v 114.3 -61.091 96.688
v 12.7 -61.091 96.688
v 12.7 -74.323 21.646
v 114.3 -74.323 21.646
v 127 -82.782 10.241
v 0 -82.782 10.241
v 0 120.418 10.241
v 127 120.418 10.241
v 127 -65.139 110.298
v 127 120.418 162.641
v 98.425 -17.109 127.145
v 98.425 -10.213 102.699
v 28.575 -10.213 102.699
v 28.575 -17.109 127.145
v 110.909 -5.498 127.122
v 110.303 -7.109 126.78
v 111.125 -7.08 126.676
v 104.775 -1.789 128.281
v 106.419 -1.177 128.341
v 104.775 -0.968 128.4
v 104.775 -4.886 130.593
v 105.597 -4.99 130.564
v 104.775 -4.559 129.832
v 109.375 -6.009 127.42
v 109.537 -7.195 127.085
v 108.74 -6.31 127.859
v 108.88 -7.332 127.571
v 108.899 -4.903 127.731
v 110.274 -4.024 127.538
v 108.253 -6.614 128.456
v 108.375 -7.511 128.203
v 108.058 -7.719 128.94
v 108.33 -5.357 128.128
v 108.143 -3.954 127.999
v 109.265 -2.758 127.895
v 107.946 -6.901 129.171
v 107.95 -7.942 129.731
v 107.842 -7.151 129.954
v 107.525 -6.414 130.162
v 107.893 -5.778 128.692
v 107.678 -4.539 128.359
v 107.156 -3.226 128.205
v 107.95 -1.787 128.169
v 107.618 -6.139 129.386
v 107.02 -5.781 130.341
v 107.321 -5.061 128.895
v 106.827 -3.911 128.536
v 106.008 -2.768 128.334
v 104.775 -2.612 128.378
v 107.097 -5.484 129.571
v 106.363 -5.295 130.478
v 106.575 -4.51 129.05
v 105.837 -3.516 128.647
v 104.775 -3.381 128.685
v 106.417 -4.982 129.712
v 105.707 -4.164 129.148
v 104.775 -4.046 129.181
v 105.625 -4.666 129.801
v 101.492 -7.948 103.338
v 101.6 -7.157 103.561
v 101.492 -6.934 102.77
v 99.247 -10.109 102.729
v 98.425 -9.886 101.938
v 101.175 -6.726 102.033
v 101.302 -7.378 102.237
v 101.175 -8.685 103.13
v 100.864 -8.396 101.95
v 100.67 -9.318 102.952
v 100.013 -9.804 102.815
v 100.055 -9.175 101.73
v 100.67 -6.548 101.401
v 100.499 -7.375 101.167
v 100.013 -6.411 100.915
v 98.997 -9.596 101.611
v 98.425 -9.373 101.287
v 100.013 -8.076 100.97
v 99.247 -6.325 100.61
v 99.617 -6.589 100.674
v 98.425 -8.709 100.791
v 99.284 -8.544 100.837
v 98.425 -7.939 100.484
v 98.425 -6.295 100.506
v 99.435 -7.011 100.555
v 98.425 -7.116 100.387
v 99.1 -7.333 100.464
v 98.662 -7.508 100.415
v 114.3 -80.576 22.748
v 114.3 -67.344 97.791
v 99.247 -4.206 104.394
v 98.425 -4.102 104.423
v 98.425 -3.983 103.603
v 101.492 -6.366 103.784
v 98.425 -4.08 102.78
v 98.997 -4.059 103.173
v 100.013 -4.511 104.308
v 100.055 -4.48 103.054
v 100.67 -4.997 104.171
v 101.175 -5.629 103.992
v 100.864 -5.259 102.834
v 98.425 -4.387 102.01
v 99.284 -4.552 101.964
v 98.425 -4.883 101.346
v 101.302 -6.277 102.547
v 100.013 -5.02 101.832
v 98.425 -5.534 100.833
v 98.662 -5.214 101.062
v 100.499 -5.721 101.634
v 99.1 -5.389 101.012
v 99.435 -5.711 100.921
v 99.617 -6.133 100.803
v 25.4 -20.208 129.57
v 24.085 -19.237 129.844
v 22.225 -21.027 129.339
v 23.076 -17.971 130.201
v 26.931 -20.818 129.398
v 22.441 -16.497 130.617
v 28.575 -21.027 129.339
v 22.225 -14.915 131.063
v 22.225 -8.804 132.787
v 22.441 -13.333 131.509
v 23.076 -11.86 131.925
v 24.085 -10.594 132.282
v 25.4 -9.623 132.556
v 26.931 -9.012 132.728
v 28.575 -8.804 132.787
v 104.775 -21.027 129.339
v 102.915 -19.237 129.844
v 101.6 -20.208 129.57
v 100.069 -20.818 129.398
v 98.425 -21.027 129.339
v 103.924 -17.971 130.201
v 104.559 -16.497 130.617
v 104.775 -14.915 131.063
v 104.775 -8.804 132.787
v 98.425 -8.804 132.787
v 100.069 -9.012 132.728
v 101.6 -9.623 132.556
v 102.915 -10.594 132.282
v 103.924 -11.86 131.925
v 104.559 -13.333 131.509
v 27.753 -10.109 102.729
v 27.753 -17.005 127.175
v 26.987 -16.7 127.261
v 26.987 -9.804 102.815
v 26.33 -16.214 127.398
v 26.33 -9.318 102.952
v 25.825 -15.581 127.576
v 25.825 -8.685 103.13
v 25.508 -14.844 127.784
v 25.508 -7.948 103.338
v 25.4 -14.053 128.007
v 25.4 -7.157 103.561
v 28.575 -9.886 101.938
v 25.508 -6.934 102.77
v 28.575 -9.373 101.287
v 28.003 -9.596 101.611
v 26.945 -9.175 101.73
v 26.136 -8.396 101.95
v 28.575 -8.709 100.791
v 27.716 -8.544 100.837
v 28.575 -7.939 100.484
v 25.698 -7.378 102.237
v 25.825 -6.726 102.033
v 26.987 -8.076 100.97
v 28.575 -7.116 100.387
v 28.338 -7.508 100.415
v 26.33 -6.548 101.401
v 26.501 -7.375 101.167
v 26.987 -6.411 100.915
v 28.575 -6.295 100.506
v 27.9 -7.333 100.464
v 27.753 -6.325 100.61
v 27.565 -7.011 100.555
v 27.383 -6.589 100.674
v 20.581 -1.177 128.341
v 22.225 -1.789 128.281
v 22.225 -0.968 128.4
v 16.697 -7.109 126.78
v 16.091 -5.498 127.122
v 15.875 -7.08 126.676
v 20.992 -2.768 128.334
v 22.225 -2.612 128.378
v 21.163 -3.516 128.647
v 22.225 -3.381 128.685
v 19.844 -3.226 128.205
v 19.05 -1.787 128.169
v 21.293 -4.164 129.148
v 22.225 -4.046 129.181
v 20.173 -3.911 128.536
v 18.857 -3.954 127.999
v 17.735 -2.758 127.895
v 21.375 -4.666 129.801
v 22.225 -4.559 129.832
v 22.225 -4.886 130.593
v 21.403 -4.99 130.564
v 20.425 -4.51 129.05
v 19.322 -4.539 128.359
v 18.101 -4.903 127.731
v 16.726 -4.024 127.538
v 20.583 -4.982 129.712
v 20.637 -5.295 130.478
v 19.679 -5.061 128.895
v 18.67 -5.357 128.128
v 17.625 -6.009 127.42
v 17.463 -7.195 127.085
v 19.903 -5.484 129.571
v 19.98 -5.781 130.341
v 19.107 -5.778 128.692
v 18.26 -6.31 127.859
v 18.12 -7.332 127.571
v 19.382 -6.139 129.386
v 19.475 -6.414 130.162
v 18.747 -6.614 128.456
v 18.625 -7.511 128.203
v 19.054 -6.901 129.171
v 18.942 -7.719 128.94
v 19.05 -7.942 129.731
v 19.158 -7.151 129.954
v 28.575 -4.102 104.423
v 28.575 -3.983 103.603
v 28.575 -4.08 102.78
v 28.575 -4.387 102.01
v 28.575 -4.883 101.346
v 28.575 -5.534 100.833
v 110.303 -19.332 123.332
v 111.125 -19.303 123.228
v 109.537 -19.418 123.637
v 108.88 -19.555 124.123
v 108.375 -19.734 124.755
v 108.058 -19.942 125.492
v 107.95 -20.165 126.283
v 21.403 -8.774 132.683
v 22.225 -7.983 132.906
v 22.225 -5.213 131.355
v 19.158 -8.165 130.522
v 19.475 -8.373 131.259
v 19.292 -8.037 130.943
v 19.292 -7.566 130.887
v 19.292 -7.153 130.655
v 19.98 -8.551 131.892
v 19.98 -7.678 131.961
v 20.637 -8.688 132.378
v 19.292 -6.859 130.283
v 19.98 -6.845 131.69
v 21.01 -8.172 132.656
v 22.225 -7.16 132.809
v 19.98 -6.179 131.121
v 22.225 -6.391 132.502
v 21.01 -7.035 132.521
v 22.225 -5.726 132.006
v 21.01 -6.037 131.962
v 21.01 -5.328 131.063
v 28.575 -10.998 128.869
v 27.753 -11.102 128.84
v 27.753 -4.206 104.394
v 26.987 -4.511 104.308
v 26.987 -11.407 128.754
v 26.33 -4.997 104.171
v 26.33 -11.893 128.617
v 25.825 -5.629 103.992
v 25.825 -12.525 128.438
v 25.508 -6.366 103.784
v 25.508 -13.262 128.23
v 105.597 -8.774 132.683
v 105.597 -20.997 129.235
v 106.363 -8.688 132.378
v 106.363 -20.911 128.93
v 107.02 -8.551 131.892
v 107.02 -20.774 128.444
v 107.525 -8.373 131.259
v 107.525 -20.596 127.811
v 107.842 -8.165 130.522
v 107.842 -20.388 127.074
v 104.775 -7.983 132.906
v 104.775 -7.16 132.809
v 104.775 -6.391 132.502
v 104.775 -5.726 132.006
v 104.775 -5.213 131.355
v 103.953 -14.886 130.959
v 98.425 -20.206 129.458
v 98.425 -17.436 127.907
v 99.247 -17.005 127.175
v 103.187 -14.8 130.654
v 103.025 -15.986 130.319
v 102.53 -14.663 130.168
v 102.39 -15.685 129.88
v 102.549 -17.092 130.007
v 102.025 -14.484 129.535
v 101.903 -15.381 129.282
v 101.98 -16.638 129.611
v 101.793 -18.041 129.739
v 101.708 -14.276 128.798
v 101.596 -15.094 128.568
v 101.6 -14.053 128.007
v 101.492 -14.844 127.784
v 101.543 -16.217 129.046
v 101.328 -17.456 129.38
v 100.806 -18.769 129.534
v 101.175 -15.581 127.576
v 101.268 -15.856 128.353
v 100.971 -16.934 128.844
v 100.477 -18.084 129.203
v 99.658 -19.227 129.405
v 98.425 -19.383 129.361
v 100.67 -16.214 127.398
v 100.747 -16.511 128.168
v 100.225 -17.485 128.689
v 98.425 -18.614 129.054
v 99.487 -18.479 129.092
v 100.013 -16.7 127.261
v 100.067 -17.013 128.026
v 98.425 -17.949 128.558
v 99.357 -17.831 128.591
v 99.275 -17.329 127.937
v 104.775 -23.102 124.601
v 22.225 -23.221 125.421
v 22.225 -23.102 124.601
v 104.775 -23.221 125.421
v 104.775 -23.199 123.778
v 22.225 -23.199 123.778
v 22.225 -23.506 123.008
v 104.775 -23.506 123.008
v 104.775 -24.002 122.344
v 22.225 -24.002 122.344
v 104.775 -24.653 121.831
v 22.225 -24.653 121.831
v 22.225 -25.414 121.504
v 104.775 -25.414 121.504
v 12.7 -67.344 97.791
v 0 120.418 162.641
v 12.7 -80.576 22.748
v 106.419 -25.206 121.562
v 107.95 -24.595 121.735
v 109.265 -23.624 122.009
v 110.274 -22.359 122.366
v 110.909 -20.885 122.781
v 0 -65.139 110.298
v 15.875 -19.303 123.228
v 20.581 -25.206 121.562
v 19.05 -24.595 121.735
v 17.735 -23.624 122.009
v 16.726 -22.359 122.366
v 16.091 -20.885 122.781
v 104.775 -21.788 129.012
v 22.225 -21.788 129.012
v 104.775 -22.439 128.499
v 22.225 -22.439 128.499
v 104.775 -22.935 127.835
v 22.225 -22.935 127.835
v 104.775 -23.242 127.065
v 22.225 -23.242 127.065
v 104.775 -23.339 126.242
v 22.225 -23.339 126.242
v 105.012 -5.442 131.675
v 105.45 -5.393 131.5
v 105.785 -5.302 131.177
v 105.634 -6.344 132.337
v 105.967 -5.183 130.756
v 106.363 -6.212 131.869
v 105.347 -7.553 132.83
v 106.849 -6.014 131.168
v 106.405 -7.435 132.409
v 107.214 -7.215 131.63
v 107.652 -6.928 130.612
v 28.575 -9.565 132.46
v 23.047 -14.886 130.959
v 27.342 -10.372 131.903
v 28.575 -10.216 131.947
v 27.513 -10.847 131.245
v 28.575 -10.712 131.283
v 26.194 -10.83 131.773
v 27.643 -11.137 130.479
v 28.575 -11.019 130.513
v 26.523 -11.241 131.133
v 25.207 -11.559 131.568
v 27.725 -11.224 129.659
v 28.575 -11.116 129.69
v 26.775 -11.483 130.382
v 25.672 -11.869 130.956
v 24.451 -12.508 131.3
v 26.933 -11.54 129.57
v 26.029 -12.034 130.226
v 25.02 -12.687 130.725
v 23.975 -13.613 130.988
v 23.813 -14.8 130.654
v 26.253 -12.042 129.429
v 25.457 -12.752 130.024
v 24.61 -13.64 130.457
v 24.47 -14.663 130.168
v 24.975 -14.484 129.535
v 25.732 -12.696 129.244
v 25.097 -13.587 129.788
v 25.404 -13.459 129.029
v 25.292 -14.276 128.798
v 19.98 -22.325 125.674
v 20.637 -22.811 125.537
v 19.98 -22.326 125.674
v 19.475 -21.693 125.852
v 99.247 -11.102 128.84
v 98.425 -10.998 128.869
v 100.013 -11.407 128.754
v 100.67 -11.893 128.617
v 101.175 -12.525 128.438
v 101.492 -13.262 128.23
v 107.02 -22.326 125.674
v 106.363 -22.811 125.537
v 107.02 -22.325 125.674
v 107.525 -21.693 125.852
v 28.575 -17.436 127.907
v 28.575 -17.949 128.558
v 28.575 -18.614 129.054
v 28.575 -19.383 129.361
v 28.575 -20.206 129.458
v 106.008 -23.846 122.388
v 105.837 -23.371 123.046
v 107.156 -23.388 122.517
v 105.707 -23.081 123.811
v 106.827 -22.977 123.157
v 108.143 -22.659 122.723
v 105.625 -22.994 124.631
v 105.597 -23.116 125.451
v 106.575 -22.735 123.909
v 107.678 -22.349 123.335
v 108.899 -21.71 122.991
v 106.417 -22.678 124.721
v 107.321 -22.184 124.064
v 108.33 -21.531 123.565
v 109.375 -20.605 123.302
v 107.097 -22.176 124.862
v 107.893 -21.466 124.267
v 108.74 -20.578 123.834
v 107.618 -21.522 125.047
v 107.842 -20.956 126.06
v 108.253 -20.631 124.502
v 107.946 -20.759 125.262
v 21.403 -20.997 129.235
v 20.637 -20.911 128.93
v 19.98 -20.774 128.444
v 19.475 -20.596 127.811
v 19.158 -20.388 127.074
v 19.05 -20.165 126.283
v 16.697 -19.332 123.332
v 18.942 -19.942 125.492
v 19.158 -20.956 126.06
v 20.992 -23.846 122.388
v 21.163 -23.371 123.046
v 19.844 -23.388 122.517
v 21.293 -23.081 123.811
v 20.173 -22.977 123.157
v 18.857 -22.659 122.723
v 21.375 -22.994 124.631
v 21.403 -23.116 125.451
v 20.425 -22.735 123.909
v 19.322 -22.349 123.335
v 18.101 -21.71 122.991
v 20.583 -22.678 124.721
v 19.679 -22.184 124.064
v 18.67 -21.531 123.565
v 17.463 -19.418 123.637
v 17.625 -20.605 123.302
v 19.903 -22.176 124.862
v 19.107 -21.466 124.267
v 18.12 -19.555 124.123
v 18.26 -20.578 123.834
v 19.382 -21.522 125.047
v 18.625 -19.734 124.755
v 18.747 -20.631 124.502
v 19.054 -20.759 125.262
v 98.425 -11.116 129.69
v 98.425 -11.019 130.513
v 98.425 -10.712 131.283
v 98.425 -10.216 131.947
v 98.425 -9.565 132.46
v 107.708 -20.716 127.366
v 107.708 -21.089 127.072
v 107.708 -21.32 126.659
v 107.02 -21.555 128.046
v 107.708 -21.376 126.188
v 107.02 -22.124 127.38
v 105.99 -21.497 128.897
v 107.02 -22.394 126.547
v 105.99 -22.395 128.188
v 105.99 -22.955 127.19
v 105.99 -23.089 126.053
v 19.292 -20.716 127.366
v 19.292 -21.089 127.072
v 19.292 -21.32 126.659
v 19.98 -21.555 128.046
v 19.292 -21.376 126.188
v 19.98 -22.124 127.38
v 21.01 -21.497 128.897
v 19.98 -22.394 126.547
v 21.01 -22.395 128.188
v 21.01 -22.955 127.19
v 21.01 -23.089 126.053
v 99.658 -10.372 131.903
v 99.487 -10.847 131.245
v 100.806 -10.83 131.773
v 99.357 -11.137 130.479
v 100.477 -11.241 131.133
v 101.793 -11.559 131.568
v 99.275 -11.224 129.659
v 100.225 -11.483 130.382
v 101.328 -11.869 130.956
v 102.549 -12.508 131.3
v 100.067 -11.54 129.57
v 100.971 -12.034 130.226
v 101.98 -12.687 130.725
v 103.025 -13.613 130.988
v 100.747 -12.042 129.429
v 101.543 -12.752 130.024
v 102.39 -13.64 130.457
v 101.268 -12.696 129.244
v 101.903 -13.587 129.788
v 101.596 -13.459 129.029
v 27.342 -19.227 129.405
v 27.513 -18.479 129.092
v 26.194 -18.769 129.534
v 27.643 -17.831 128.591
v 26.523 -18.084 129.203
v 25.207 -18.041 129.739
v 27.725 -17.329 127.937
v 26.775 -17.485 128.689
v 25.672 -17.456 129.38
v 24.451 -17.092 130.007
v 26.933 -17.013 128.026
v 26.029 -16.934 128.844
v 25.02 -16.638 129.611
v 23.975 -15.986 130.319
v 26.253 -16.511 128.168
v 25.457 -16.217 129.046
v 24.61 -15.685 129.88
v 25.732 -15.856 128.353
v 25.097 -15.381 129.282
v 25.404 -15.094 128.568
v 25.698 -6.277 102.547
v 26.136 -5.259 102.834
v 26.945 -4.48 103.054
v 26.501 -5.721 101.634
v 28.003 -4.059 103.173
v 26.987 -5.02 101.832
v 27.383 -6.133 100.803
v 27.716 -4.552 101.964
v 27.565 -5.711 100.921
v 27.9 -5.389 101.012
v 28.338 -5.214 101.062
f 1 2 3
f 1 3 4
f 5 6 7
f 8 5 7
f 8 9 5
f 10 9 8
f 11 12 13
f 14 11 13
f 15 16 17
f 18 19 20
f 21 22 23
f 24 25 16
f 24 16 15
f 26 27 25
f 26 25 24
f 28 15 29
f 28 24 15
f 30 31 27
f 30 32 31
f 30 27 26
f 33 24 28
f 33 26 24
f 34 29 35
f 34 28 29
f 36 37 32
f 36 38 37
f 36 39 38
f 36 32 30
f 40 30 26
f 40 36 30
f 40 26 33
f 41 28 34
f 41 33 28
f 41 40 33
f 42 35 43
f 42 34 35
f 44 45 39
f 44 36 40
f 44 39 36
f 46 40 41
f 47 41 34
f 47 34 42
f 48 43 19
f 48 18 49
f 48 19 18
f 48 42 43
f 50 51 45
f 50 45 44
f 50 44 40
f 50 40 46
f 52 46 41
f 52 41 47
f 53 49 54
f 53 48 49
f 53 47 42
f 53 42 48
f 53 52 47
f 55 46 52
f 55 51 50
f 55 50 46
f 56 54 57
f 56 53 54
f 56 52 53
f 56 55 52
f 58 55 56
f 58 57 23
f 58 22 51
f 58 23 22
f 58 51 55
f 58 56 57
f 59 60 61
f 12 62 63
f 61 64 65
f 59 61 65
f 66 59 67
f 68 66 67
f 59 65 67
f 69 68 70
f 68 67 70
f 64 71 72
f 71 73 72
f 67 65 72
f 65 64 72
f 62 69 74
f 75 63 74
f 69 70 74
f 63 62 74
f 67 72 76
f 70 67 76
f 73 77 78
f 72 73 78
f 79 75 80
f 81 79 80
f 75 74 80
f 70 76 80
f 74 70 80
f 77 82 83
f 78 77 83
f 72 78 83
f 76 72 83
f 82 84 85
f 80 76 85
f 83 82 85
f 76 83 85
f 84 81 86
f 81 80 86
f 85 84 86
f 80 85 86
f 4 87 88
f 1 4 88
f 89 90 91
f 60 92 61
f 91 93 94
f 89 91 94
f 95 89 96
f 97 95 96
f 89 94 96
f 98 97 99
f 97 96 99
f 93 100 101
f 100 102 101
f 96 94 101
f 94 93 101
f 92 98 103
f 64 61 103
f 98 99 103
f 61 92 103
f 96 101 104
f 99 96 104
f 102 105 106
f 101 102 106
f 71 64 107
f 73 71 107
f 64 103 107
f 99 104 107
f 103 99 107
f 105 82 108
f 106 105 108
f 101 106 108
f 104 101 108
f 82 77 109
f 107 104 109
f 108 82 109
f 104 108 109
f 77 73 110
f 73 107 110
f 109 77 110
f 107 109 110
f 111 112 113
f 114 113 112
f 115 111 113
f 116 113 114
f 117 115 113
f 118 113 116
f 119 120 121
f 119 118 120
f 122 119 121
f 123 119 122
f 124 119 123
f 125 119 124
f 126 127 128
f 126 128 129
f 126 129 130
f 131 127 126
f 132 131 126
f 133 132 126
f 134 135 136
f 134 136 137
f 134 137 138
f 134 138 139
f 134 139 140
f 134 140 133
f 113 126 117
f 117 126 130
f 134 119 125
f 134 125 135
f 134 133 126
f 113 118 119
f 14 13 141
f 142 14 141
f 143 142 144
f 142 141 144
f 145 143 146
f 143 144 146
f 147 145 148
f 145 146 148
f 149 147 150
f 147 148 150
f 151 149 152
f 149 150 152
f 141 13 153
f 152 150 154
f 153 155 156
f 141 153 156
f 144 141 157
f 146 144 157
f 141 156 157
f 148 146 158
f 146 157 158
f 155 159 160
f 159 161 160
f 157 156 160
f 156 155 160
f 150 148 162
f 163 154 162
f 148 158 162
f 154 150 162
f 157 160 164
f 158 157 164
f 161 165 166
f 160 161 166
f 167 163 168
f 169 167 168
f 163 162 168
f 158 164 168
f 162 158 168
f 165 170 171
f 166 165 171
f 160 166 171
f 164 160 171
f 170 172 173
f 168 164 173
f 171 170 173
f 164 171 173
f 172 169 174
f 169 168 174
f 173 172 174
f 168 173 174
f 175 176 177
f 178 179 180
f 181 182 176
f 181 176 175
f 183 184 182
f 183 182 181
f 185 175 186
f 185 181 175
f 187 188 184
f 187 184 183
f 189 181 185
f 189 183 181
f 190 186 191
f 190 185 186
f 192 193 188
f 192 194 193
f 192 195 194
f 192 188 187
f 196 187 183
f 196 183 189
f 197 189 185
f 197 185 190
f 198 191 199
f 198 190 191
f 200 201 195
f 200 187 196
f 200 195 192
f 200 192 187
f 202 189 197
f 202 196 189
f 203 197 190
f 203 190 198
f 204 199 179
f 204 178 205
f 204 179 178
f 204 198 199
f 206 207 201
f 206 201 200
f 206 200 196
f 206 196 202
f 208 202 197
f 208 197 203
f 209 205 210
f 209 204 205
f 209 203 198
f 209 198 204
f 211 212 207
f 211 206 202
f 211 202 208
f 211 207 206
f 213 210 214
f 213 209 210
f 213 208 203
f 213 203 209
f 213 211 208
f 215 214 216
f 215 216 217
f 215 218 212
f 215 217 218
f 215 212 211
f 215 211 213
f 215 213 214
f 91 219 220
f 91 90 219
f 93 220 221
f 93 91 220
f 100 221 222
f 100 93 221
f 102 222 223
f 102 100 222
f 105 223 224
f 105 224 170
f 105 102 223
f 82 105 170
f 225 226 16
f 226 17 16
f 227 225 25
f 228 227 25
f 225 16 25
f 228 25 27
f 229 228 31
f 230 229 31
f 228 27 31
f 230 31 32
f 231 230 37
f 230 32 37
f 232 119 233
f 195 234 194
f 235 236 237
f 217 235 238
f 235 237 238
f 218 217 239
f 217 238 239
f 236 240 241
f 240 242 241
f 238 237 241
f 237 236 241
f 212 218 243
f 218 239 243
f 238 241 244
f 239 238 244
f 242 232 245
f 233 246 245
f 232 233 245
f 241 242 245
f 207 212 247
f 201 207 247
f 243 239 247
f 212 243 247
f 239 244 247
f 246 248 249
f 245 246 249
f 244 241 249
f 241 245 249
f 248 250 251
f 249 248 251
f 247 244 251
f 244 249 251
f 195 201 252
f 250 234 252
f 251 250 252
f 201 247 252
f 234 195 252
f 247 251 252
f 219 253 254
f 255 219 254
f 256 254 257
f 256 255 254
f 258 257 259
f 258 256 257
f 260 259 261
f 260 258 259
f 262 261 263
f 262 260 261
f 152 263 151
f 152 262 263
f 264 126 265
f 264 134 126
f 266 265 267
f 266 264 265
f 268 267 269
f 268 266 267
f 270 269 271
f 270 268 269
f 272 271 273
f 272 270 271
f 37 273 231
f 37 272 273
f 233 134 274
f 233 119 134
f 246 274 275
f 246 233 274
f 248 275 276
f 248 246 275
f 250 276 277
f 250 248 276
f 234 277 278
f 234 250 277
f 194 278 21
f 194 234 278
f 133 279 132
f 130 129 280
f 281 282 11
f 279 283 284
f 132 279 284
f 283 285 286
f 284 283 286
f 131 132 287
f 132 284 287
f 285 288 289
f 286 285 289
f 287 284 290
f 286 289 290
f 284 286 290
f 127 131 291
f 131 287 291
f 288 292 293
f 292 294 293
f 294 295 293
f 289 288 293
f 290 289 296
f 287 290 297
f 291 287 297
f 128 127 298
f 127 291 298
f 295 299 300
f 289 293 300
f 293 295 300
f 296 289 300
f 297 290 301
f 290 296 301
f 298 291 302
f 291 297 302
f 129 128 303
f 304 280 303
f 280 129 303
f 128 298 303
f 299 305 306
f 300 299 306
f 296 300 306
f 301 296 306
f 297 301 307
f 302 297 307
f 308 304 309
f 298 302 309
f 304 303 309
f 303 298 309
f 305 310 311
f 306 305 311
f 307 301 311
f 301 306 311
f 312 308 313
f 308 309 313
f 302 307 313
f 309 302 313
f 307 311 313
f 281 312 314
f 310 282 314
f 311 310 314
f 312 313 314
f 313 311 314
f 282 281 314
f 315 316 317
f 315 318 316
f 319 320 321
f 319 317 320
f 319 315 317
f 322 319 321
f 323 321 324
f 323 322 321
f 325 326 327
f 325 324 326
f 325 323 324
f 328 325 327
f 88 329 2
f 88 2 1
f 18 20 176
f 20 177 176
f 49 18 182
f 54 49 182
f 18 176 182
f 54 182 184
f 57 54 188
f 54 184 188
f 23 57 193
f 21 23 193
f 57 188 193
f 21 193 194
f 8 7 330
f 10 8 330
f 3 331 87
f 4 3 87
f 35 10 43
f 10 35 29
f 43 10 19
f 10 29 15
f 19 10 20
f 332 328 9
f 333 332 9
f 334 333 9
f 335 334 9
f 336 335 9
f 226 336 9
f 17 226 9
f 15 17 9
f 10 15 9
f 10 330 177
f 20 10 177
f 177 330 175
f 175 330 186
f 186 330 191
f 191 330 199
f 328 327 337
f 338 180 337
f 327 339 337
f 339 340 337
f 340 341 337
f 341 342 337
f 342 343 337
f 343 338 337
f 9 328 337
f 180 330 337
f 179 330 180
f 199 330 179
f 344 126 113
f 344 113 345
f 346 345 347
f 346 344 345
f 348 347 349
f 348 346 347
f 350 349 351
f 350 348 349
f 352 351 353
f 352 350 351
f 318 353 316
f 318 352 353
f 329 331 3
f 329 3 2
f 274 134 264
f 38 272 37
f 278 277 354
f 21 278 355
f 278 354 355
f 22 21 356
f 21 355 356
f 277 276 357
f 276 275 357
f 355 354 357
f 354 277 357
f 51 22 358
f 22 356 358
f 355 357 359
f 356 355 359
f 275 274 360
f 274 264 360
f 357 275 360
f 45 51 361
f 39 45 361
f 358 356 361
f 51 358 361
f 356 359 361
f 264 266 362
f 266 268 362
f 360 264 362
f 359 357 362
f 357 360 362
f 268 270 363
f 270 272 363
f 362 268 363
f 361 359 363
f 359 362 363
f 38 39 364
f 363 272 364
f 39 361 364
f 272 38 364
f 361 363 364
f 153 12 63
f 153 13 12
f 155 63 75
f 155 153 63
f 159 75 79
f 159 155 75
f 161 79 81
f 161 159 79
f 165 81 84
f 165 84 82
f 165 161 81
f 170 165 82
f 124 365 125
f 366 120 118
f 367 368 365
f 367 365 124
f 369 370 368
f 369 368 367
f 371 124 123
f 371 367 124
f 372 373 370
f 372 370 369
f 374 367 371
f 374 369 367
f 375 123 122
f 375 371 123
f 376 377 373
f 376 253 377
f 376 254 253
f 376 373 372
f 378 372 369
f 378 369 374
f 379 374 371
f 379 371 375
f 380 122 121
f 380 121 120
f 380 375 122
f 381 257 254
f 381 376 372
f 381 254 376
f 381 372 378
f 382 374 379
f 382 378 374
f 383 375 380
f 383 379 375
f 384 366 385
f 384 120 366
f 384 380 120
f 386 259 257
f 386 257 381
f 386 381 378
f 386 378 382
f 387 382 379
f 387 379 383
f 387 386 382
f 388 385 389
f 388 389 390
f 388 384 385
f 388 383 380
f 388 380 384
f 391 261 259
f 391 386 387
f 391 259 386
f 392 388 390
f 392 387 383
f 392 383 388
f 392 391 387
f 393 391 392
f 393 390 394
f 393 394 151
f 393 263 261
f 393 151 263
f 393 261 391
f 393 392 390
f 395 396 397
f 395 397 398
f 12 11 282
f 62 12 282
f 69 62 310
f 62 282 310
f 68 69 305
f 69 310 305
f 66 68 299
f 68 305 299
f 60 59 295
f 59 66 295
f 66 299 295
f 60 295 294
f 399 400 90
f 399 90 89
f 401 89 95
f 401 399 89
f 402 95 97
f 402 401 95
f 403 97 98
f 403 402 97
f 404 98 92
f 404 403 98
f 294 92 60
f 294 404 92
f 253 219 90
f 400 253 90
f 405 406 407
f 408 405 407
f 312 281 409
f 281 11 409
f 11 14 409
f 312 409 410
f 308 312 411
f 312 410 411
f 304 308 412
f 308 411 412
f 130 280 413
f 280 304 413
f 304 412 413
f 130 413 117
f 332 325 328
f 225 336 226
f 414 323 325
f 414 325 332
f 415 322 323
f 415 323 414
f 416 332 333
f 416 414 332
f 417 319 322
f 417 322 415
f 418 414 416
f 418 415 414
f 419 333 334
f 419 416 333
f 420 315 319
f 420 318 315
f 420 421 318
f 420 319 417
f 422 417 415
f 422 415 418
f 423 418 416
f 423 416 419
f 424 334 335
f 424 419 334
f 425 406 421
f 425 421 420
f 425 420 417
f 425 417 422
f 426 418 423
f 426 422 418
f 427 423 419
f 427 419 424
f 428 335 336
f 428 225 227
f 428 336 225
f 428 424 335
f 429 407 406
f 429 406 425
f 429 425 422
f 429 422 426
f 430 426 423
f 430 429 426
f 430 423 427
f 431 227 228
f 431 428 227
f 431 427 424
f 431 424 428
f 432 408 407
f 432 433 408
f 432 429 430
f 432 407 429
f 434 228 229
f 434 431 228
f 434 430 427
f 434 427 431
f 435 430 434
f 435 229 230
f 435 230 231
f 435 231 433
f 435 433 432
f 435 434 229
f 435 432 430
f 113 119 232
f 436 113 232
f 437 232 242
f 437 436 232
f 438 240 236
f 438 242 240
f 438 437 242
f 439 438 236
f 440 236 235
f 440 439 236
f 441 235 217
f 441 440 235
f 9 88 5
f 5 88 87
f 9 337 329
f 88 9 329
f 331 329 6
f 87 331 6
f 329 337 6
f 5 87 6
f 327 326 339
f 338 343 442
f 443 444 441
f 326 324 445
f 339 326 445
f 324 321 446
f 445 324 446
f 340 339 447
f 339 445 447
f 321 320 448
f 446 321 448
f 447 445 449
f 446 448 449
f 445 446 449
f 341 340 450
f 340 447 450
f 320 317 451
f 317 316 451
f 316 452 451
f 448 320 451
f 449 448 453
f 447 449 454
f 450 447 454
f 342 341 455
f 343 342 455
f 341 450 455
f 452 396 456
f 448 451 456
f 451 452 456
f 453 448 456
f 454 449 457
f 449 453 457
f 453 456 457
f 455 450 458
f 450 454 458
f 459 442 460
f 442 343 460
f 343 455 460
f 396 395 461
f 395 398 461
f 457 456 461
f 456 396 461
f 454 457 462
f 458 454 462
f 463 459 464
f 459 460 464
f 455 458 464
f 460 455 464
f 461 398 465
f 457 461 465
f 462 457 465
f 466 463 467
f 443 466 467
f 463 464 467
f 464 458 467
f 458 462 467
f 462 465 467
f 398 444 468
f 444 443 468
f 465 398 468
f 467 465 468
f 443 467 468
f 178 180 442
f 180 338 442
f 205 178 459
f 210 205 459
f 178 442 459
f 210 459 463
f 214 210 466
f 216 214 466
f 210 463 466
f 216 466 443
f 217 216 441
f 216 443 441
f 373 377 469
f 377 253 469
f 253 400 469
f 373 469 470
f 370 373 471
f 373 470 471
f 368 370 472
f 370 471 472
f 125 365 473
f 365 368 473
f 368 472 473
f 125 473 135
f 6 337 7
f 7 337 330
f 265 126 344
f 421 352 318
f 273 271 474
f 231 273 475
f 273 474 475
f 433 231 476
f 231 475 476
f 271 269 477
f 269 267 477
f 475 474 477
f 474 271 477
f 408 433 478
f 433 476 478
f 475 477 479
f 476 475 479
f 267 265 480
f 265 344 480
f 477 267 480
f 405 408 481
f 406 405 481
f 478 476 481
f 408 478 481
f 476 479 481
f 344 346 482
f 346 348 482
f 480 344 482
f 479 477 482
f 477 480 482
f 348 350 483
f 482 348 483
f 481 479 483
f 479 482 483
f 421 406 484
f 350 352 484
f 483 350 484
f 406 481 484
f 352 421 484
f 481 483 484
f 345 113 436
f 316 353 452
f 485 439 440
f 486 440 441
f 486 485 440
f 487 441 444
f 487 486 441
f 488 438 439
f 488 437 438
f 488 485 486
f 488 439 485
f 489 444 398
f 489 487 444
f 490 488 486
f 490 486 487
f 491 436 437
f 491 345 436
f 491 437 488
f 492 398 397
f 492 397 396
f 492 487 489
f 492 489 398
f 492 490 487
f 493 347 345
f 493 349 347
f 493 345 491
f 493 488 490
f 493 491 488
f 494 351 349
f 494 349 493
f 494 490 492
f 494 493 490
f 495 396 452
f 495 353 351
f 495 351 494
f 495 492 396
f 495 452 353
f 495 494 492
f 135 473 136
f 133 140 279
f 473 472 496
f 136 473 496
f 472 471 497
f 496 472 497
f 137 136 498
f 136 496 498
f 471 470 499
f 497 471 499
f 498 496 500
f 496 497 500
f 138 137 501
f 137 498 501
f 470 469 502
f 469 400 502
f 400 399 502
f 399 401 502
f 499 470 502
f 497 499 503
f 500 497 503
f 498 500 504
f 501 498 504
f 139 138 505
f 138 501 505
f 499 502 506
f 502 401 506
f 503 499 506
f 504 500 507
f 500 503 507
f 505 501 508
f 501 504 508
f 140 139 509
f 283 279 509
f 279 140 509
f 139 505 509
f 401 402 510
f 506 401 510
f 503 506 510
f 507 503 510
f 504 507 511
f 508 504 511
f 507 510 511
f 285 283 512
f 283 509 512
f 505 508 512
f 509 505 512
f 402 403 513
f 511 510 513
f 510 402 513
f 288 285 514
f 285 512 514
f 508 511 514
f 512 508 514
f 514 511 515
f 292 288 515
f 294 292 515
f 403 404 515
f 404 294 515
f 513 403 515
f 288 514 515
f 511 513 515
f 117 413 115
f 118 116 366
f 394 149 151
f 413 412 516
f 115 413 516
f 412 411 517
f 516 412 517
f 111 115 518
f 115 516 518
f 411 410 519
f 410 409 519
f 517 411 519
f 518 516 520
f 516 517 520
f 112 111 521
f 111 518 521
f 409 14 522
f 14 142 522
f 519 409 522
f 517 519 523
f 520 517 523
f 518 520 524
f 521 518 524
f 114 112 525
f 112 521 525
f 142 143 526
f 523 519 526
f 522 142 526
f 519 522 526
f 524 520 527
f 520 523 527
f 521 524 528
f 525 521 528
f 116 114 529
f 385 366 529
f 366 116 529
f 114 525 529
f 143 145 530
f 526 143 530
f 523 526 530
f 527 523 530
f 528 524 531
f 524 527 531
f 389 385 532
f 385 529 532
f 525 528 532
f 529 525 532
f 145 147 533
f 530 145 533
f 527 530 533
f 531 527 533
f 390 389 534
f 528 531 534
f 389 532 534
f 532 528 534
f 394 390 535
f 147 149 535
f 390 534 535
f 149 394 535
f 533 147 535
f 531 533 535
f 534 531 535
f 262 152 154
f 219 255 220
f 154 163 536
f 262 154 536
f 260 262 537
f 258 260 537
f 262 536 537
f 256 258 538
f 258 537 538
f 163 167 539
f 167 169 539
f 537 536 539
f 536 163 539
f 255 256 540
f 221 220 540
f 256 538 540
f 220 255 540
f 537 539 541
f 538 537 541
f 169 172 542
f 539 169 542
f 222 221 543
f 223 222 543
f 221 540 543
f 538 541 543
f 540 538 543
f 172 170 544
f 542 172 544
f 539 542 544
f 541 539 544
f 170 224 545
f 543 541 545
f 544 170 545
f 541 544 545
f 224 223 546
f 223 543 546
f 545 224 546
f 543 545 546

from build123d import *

# Parameters (mm, degrees)
F1_DEPTH = 127
F2_W     = 101.6
F2_H     = 76.2
F3_DEPTH = 6.35
F4_W     = 76.2
F4_H     = 6.35
F5_DEPTH = 25.4
F7_DEPTH = 6.35
F8_R     = 3.17499
F9_R     = 3.17499


# Not quite as in the source:
# - a fillet or chamfer is up to 0.001 mm smaller than in the source, because OpenCascade refuses the exact size


with BuildPart() as f1:
    # F0 (on Right) → F1 (new body)
    with BuildSketch(Plane.YZ):
        Polygon((-65.1389909149, 110.2977480159), (-82.7816457659, 10.2412803099), (120.4183542341, 10.2412803099), (120.4183542341, 162.6412803099), align=None)
    extrude(amount=F1_DEPTH)

    # F2 (on face) → F3 (cut)
    with BuildSketch(Plane(origin=(0, -82.036835794, 14.4653075624), x_dir=(1, 0, 0), z_dir=(0, -0.984807753, 0.1736481777))):
        with Locations((63.5, 46.5108103184)):
            Rectangle(F2_W, F2_H)
    extrude(amount=-F3_DEPTH, mode=Mode.SUBTRACT)

    # F4 (on face) → F5 (cut)
    with BuildSketch(Plane(origin=(0, -33.6216432412, 119.1884190074), x_dir=(1, 0, 0), z_dir=(0, -0.2714930529, 0.9624403993))):
        with Locations((63.5, 21.2276759098)):
            Rectangle(F4_W, F4_H)
    extrude(amount=-F5_DEPTH, mode=Mode.SUBTRACT)

    # F6 (on face) → F7 (join)
    with BuildSketch(Plane(origin=(0, -33.6216432412, 119.1884190074), x_dir=(1, 0, 0), z_dir=(0, -0.2714930529, 0.9624403993))):
        Polygon((25.4, 30.7526759098), (25.4, 24.4026759098), (101.6, 24.4026759098), (101.6, 18.0526759098), (101.6, 11.7026759098), (107.95, 11.7026759098), (107.95, 30.7526759098), align=None)
        Polygon((25.4, 18.0526759098), (25.4, 24.4026759098), (25.4, 30.7526759098), (19.05, 30.7526759098), (19.05, 11.7026759098), (101.6, 11.7026759098), (101.6, 18.0526759098), align=None)
    extrude(amount=F7_DEPTH)

    # F8 (radius 3.175 in the source; OpenCascade refuses exactly that, so slightly less here)
    f8_edges = [f1.edges().sort_by_distance(p)[0] for p in [
        (63.5, -22.358515, 122.365614),
        (107.95, -13.19127, 124.951586),
        (63.5, -4.024026, 127.537557),
        (19.05, -13.19127, 124.951586),
        (63.5, -24.082496, 128.477111),
        (107.95, -14.915251, 131.063082),
        (63.5, -5.748006, 133.649053),
        (19.05, -14.915251, 131.063082),
        (19.05, -23.220506, 125.421362),
        (19.05, -4.886016, 130.593305),
        (107.95, -23.220506, 125.421362),
        (107.95, -4.886016, 130.593305),
        (63.5, -11.859503, 131.925073),
        (101.6, -14.915251, 131.063082),
        (63.5, -17.971, 130.201092),
        (25.4, -14.915251, 131.063082),
        (25.4, -13.661047, 114.92235),
        (25.4, -7.549551, 116.646331),
        (101.6, -7.549551, 116.646331),
        (101.6, -13.661047, 114.92235),
    ]]
    fillet(f8_edges, radius=F8_R)

    # F9 (radius 3.175 in the source; OpenCascade refuses exactly that, so slightly less here)
    f9_edges = [f1.edges().sort_by_distance(p)[0] for p in [
        (63.5, -3.239599, 101.36759),
    ]]
    fillet(f9_edges, radius=F9_R)


solid = f1.part
